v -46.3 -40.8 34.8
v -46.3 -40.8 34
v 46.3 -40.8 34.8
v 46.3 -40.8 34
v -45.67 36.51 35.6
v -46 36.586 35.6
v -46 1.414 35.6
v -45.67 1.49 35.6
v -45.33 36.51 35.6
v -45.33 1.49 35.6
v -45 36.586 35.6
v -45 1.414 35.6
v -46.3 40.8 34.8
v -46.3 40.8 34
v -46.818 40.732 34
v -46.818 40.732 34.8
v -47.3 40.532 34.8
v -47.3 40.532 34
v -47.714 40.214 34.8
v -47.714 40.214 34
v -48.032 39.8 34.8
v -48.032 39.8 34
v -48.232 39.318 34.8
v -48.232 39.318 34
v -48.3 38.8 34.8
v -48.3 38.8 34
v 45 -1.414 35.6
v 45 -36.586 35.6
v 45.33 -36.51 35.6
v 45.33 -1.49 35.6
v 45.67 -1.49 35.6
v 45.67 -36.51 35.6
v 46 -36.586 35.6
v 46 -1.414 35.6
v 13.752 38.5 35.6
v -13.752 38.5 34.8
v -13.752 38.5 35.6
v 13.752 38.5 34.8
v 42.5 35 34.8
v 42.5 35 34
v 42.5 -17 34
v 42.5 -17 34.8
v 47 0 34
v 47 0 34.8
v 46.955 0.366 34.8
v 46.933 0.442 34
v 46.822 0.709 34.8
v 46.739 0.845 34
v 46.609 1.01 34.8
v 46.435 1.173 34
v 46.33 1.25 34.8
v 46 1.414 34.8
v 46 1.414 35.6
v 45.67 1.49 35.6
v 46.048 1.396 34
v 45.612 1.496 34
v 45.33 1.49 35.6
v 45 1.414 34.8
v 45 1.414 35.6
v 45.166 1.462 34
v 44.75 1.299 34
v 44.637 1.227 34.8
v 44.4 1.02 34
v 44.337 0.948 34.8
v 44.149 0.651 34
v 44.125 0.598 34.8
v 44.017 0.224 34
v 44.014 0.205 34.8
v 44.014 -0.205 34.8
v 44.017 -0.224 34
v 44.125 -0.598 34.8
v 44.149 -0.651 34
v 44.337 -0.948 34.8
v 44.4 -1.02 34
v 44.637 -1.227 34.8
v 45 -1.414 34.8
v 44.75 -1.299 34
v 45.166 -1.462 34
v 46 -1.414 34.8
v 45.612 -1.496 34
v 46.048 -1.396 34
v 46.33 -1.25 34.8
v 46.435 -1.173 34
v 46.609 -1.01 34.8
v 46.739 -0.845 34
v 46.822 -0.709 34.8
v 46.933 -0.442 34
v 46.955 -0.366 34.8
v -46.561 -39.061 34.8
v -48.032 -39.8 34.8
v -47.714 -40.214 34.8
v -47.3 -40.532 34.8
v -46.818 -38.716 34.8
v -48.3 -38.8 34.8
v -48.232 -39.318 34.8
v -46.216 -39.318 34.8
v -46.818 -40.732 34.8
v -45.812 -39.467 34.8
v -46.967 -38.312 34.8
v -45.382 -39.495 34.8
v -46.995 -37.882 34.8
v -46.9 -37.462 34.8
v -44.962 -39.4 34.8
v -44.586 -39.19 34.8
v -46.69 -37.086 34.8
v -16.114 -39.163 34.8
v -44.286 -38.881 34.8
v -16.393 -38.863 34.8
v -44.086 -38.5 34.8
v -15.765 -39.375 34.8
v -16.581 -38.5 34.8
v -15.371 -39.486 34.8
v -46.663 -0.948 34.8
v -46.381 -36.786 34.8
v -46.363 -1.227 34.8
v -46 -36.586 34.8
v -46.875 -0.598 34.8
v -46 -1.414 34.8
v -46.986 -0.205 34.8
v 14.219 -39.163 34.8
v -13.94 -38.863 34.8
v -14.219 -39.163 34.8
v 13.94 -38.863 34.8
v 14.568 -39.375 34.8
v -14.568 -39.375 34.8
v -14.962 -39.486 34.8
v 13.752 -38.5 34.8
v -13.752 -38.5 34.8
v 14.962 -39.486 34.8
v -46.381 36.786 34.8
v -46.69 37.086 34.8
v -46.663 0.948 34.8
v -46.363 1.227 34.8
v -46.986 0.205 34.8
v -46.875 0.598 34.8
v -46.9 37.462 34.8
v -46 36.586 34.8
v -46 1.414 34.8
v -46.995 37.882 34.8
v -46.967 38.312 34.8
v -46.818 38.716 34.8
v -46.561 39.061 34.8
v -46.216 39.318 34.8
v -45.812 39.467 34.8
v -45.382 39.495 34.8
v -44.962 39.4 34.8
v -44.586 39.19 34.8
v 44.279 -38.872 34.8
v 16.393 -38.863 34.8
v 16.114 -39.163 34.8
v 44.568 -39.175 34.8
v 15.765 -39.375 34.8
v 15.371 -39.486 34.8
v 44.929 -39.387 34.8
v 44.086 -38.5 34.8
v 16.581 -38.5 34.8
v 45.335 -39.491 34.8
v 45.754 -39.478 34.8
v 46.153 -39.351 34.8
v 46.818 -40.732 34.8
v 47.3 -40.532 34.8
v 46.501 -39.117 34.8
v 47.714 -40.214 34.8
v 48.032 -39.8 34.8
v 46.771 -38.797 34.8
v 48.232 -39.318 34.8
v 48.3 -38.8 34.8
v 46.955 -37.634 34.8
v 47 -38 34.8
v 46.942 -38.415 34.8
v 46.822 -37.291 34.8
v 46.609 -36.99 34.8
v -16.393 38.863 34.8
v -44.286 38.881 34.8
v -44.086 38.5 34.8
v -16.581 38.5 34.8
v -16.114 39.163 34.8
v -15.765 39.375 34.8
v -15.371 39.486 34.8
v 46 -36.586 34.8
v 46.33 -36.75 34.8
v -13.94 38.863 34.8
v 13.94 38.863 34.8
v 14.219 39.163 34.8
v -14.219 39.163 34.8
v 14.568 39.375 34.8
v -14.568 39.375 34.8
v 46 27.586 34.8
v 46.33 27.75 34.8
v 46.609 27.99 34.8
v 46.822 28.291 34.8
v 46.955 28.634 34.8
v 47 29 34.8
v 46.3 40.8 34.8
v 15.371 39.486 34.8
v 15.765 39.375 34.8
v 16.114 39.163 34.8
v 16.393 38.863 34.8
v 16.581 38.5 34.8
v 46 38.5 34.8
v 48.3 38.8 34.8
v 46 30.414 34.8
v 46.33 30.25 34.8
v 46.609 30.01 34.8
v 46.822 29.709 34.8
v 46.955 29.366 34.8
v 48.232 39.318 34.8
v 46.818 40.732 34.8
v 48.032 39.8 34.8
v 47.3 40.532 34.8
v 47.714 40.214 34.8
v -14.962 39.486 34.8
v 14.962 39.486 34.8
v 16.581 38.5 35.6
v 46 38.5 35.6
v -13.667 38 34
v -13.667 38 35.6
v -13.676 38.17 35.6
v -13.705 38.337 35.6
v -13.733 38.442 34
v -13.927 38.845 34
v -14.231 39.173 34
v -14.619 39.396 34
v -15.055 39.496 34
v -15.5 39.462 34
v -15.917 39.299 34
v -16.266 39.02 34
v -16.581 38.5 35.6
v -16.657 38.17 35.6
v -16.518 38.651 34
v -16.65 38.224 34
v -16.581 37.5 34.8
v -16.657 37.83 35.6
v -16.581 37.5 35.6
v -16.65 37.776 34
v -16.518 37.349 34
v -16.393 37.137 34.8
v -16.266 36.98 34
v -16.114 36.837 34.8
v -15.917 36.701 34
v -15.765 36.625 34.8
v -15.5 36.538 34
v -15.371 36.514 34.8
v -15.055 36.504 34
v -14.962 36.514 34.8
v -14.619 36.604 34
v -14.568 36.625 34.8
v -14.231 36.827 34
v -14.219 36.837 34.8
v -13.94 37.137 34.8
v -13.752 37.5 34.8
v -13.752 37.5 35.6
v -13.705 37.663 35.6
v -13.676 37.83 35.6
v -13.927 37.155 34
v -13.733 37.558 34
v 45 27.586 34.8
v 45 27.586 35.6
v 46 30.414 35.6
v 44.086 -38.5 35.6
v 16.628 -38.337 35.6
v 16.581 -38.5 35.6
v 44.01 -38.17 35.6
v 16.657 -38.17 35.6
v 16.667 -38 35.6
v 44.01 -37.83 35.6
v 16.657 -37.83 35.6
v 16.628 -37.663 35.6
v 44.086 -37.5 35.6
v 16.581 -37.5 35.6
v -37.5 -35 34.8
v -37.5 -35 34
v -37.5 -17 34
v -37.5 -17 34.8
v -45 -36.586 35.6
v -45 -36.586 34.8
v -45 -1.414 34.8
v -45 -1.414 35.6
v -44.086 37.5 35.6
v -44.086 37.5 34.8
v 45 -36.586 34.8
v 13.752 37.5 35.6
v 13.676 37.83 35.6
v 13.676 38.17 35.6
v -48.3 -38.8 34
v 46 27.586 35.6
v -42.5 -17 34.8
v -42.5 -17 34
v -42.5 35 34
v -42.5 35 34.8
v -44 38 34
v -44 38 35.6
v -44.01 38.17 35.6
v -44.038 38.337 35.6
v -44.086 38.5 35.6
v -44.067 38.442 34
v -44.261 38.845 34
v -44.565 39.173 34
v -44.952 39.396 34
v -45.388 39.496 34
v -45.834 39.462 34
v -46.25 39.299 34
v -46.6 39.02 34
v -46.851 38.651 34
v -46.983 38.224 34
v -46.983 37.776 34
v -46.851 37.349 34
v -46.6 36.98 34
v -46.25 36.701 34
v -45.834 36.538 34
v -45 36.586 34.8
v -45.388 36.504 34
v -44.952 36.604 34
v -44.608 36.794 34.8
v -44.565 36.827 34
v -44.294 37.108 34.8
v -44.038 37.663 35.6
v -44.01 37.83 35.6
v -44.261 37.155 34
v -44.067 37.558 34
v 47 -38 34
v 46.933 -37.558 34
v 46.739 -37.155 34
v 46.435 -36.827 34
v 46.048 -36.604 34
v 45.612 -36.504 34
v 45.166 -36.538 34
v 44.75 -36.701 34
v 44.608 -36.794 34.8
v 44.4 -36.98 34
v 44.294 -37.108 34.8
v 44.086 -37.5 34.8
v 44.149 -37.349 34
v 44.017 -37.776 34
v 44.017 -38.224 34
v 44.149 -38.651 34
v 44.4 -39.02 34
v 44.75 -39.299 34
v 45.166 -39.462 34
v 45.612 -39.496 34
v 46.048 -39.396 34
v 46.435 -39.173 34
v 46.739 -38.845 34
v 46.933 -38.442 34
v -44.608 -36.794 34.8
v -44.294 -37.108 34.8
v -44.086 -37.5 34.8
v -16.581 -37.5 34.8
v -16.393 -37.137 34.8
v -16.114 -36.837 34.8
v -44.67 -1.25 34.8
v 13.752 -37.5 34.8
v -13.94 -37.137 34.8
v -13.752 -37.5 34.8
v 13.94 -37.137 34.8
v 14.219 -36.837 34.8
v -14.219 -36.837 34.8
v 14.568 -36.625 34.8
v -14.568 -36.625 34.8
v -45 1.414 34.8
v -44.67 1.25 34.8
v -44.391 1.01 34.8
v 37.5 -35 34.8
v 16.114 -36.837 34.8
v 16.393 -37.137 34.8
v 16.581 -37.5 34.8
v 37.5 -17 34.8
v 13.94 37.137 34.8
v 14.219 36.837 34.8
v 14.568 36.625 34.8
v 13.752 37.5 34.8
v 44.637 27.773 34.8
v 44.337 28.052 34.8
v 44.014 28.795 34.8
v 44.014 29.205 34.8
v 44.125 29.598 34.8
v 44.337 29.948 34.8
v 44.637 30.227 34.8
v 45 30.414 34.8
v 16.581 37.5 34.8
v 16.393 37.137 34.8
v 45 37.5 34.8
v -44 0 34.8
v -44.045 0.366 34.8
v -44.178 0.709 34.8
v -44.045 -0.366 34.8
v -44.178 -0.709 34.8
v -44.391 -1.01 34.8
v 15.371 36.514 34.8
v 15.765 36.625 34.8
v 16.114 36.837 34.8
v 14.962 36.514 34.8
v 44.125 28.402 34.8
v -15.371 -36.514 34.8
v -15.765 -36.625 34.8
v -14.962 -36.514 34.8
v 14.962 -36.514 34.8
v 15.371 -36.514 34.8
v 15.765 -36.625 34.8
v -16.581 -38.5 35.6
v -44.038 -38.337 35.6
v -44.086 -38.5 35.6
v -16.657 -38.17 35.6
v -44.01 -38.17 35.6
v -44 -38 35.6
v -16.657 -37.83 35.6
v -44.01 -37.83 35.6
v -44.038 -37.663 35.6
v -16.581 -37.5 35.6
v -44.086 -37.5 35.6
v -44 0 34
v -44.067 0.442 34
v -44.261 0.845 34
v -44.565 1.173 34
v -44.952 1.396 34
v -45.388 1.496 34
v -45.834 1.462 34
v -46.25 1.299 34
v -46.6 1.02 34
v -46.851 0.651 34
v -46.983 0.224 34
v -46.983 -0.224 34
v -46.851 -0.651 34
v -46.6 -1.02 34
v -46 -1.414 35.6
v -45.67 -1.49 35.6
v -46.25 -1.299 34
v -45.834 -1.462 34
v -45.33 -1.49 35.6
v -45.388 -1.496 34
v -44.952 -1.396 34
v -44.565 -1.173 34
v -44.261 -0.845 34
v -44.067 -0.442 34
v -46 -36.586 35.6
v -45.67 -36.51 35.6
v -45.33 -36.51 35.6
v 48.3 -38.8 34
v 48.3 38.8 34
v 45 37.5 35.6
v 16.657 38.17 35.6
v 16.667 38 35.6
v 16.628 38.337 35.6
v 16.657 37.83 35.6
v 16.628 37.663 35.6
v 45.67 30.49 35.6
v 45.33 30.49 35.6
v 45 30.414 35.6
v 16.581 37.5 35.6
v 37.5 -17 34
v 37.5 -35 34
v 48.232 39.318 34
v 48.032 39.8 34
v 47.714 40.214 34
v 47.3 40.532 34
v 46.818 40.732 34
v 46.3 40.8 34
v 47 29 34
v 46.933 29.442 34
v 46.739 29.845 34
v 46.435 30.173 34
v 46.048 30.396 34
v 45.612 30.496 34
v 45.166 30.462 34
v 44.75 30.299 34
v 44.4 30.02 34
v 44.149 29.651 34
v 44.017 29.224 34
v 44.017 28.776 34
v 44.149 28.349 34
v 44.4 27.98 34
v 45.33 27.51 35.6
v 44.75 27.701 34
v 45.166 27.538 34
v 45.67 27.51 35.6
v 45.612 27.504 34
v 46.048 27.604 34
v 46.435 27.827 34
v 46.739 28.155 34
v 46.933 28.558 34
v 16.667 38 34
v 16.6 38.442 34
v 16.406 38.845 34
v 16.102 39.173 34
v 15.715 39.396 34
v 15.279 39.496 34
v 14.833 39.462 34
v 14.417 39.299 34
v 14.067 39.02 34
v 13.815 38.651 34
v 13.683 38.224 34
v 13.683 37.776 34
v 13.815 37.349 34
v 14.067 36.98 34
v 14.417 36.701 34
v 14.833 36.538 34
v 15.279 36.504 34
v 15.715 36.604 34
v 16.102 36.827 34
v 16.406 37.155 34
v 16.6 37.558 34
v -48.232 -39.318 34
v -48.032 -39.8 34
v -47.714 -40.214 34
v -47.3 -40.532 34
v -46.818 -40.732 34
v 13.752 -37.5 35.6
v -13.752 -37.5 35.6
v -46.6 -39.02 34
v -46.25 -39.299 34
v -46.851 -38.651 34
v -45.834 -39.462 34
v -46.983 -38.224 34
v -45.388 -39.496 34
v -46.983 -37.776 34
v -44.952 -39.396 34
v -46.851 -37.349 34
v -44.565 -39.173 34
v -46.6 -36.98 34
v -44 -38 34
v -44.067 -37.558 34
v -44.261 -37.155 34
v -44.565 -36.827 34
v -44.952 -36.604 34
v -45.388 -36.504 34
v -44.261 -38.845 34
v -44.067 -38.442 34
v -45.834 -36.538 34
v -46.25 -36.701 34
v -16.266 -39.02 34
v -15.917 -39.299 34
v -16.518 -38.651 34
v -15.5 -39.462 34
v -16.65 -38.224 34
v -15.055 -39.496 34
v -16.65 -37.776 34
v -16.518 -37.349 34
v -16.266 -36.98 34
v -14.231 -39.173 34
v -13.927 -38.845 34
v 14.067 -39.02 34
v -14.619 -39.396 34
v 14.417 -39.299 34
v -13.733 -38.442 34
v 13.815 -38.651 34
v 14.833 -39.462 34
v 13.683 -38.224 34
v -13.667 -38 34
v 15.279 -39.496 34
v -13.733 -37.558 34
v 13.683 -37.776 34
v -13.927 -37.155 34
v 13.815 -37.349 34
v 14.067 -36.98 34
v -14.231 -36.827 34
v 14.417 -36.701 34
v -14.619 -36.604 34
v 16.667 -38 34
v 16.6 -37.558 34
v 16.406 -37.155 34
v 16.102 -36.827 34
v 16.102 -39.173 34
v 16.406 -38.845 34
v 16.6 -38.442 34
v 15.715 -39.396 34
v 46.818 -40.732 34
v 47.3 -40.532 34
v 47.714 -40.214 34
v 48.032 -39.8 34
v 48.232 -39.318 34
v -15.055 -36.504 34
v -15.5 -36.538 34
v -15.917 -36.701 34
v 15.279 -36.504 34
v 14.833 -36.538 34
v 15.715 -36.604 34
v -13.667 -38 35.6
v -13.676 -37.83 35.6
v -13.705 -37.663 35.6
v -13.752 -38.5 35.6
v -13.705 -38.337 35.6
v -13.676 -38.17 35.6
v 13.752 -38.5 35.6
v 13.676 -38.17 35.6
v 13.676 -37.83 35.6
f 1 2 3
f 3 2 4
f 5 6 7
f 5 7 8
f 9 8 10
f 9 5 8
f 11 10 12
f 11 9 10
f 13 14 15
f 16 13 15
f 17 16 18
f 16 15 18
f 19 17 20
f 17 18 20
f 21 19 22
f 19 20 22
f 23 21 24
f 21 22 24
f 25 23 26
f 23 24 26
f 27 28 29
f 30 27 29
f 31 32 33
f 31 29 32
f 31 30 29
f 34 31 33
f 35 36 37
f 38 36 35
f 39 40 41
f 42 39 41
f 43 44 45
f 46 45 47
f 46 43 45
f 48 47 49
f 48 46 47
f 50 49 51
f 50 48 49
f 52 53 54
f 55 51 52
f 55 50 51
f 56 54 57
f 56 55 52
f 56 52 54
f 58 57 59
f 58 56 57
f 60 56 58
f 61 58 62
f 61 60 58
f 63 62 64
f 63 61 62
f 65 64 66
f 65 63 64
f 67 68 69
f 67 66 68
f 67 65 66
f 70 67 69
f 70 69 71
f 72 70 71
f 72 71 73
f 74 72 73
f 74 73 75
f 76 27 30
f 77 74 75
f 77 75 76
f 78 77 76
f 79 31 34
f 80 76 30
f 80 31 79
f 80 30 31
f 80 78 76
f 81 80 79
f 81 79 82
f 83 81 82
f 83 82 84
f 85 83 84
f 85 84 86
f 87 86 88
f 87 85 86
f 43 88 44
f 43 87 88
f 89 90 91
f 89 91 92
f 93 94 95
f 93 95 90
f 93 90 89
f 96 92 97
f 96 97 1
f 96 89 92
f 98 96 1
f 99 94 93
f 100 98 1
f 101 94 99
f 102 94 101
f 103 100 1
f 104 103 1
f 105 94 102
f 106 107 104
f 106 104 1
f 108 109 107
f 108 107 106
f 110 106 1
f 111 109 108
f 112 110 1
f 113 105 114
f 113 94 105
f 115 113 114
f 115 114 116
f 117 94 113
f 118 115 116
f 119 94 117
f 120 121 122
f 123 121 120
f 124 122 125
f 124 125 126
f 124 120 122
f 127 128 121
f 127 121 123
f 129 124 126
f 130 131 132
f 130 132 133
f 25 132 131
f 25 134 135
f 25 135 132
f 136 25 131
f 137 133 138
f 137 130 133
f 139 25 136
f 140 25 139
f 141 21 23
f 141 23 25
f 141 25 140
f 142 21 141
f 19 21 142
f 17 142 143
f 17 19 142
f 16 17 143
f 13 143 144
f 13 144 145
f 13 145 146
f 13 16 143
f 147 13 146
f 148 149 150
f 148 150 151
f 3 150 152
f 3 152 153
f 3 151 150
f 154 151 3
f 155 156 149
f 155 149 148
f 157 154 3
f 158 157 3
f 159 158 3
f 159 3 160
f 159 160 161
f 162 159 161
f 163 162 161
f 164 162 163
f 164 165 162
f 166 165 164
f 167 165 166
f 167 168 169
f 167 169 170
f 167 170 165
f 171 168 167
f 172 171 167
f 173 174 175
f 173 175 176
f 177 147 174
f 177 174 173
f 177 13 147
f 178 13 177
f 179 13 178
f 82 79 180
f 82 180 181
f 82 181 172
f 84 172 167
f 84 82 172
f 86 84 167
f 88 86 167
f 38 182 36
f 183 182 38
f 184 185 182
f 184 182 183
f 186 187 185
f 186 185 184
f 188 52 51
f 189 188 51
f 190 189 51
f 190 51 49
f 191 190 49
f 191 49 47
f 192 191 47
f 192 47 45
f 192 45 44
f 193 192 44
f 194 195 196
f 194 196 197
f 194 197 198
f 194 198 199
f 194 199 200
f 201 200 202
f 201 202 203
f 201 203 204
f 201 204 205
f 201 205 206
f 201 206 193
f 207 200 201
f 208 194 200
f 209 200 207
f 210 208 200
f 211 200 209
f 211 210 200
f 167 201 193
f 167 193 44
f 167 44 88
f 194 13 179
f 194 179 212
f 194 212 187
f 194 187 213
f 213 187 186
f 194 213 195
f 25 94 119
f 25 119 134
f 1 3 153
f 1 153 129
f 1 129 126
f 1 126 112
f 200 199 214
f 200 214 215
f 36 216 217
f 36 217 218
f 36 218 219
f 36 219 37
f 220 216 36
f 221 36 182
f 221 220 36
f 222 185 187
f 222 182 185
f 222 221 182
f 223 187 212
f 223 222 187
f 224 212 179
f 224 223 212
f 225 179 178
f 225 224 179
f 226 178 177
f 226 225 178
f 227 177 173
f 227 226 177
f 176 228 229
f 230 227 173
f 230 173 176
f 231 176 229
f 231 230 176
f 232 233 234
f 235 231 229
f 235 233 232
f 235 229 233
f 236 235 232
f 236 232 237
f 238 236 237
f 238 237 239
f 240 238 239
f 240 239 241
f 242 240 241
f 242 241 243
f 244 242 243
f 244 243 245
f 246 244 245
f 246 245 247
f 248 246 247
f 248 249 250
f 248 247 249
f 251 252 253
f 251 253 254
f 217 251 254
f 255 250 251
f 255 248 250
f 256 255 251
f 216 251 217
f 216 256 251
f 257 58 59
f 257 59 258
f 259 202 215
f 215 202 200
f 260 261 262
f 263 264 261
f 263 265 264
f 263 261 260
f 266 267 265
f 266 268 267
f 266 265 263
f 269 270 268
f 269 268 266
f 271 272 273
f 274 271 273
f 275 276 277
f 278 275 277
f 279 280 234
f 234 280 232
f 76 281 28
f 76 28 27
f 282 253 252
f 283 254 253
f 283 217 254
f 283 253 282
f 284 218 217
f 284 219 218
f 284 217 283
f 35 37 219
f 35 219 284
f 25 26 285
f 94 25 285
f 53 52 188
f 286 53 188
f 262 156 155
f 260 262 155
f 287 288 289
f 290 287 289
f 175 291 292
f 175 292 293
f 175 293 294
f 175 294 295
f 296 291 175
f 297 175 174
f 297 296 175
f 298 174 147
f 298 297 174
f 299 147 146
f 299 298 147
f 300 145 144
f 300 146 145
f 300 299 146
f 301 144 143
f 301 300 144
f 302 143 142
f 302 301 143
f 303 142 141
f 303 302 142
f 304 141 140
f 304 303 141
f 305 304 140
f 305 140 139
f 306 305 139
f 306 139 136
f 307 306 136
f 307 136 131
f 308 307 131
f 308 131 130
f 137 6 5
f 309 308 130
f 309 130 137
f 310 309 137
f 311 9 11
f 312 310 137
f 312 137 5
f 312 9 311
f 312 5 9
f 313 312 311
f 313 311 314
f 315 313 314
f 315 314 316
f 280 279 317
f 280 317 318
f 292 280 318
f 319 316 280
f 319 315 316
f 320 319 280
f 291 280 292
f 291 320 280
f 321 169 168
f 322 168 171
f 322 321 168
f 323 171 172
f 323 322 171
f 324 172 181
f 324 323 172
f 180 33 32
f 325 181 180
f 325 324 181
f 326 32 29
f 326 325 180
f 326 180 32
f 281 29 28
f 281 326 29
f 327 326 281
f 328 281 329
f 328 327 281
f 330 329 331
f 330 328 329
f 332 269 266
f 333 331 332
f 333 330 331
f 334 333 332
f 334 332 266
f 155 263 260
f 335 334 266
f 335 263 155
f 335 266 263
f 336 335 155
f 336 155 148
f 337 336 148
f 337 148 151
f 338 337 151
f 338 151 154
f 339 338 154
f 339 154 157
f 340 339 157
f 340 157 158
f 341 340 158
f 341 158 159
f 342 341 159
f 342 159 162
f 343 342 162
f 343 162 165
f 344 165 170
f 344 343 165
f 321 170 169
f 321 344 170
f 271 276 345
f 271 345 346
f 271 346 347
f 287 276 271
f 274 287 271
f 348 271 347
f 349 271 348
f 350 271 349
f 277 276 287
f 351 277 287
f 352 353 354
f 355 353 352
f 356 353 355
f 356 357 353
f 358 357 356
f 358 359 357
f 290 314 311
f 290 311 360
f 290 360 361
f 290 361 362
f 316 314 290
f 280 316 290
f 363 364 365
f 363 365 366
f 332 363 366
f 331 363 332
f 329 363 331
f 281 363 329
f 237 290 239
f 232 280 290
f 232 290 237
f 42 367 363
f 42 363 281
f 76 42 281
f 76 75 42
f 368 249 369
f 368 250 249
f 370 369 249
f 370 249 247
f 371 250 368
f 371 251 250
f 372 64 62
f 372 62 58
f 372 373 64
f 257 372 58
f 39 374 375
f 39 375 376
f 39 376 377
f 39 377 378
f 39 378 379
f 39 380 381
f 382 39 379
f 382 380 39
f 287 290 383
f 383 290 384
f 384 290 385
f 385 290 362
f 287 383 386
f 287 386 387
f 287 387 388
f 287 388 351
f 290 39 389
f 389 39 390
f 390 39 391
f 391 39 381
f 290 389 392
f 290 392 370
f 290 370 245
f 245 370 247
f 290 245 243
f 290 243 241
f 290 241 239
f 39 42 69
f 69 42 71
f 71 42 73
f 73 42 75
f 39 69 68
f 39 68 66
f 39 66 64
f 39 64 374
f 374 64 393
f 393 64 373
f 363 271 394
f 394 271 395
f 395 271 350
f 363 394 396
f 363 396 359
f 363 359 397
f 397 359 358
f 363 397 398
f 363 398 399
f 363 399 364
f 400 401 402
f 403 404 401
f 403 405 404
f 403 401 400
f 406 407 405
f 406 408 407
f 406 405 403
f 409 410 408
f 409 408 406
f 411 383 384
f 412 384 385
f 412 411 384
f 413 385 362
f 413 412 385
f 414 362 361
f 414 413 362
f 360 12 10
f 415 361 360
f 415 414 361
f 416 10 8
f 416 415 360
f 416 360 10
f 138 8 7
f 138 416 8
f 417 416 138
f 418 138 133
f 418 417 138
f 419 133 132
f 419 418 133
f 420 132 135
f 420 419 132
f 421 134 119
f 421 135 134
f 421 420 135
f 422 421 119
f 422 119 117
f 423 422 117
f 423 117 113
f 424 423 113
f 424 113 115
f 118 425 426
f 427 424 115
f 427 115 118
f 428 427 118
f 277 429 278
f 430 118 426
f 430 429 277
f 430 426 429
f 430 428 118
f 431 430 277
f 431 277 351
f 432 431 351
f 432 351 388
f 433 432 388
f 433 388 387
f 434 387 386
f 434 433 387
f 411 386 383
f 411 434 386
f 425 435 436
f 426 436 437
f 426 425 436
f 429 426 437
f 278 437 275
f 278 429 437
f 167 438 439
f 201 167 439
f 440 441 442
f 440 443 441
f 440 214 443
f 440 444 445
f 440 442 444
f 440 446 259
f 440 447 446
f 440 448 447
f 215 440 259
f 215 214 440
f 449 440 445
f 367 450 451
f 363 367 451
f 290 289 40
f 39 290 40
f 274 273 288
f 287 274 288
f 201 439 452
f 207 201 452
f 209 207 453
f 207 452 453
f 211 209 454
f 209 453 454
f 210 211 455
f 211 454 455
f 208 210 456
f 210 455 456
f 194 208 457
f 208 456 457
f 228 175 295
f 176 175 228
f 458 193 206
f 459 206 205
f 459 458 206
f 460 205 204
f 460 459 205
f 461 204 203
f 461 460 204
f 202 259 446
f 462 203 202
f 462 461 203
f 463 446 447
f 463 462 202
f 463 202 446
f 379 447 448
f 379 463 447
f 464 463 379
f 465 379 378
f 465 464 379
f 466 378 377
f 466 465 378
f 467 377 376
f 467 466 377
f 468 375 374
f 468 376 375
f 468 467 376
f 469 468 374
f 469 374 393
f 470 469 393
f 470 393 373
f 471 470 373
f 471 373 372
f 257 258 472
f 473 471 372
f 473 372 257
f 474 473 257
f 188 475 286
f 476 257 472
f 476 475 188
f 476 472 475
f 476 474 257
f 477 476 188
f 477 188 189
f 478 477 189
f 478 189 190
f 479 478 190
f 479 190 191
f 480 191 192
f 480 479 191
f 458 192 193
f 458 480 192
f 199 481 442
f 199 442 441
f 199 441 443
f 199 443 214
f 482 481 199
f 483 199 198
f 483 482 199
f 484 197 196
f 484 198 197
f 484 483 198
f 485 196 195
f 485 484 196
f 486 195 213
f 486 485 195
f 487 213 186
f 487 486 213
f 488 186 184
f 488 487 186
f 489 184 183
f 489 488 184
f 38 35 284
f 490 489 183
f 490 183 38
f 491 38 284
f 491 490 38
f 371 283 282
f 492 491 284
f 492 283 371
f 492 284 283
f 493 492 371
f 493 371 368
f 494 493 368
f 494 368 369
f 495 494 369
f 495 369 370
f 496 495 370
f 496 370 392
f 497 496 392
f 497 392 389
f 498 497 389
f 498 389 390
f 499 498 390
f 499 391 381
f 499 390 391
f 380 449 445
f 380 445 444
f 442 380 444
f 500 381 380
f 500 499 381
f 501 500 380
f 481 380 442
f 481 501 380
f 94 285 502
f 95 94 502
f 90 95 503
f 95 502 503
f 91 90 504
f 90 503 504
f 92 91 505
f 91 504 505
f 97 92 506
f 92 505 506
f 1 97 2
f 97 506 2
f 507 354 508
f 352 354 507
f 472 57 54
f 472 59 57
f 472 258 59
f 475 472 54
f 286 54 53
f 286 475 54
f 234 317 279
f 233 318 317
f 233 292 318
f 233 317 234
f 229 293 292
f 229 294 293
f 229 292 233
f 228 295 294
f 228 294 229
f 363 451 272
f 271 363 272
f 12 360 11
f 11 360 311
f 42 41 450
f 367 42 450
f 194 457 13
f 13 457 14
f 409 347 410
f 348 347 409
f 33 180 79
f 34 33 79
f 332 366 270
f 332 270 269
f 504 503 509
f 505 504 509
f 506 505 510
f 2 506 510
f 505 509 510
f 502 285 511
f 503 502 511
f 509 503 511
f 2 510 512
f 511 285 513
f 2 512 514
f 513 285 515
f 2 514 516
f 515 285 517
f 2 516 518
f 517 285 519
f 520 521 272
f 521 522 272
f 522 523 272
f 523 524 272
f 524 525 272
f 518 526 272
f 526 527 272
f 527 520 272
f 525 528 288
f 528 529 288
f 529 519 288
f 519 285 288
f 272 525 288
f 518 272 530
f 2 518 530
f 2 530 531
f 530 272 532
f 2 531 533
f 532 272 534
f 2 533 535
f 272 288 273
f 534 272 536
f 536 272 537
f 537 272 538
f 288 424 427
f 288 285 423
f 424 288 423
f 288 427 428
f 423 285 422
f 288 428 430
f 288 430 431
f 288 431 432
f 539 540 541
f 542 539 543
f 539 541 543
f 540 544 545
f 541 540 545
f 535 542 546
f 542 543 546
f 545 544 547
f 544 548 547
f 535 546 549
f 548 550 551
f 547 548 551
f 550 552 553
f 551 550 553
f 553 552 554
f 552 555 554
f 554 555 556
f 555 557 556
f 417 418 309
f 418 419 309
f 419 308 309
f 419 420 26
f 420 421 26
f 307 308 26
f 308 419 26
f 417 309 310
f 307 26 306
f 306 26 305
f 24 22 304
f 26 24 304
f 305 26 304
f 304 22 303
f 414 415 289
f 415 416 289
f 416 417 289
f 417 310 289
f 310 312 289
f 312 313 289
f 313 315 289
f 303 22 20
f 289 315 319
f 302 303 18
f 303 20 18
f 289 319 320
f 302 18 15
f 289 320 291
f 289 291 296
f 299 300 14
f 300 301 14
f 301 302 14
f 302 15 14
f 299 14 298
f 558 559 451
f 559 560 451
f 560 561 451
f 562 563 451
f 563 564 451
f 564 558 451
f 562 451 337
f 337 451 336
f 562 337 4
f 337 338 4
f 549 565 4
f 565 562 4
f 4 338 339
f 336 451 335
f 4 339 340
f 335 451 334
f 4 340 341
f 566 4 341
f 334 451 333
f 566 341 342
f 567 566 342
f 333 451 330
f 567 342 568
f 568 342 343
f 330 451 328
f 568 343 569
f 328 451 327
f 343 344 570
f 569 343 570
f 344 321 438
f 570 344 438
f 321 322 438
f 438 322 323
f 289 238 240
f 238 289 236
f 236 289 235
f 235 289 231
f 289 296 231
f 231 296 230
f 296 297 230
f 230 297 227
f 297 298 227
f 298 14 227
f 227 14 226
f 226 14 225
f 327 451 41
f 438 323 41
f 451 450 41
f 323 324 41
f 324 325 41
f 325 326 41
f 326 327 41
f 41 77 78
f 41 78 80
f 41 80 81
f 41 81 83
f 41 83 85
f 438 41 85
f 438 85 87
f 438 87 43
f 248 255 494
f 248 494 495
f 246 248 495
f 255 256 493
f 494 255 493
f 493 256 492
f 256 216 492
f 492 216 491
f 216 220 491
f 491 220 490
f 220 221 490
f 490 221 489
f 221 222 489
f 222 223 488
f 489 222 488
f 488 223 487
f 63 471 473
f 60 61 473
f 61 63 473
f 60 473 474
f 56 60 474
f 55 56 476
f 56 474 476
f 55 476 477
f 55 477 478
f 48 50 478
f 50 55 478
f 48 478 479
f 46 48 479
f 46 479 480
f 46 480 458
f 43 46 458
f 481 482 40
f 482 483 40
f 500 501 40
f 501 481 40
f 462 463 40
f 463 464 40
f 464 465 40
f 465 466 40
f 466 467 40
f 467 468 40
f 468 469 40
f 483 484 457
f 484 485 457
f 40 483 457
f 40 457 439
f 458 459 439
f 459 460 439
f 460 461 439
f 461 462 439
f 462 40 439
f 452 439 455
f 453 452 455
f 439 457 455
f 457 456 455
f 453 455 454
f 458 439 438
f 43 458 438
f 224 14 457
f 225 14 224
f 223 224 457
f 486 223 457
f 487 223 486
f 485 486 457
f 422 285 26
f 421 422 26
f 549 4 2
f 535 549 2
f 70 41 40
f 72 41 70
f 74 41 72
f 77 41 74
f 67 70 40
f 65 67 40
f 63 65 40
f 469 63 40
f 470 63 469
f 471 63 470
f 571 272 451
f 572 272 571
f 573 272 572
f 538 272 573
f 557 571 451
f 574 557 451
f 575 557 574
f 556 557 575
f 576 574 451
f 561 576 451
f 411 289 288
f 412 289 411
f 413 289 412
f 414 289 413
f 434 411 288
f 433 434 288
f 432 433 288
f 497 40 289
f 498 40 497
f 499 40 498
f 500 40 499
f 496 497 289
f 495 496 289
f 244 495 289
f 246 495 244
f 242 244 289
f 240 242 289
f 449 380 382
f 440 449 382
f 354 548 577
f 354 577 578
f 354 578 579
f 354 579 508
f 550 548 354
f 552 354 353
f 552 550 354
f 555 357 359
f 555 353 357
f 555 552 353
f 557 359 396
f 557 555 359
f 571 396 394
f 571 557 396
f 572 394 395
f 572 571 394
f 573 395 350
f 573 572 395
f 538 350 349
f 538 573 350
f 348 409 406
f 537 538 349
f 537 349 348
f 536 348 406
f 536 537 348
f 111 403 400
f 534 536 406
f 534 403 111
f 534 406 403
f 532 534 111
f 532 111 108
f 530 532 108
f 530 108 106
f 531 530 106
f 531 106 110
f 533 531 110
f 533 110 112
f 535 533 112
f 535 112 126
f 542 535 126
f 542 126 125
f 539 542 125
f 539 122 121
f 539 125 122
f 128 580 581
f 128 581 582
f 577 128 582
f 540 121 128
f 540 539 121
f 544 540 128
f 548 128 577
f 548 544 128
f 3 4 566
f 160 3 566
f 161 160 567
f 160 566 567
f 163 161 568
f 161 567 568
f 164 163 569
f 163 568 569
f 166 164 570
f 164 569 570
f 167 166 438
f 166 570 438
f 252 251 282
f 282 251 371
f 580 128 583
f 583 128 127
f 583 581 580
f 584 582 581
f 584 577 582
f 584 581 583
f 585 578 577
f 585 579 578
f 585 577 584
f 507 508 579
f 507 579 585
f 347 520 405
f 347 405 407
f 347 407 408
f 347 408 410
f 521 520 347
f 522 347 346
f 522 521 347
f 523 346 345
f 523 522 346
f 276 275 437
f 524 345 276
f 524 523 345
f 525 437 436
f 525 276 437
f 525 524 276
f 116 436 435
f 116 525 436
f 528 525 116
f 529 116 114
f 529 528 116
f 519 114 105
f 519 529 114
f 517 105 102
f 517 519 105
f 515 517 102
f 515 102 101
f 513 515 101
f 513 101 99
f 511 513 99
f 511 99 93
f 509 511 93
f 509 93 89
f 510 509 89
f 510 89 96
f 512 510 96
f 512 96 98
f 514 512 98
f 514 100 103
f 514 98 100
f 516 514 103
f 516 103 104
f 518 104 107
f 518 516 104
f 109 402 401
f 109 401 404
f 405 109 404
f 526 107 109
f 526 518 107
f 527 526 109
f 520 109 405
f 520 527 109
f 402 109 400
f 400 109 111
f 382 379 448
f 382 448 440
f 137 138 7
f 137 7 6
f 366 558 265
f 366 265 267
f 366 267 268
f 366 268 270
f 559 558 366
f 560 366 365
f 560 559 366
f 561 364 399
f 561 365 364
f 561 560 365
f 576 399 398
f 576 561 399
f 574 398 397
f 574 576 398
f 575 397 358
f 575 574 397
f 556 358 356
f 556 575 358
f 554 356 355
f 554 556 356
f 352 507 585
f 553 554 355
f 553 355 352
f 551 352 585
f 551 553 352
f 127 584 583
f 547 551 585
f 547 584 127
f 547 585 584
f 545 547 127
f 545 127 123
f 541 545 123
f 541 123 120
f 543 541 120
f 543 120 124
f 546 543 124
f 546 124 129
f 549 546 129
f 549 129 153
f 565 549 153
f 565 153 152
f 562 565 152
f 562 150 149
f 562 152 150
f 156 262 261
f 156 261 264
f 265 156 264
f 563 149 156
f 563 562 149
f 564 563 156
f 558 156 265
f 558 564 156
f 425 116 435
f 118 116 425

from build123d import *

# Parameters (mm, degrees)
PAD011_DEPTH         = 0.8
SKETCH019_W          = 92
SKETCH019_H          = 77
SKETCH019_W_2        = 90
SKETCH019_H_2        = 75
PAD012_DEPTH         = 1.6
SKETCH018_R          = 1.5
POCKET007_DEPTH      = 1.6
POCKET007_DEPTH_BACK = 0.8


with BuildPart() as part:
    # Sketch017 (on XY_Plane002 of Origin004) → Pad011 (new body)
    with BuildSketch(Plane.XY):
        with BuildLine():
            Line((48.3, -38.8), (48.3, 38.8))
            ThreePointArc((48.3, 38.8), (47.714214, 40.214214), (46.3, 40.8))
            Line((46.3, 40.8), (-46.3, 40.8))
            ThreePointArc((-46.3, 40.8), (-47.714214, 40.214214), (-48.3, 38.8))
            Line((-48.3, 38.8), (-48.3, -38.8))
            ThreePointArc((-48.3, -38.8), (-47.714214, -40.214214), (-46.3, -40.8))
            Line((-46.3, -40.8), (46.3, -40.8))
            ThreePointArc((46.3, -40.8), (47.714214, -40.214214), (48.3, -38.8))
        make_face()
        Polygon((-42.5, 35), (42.5, 35), (42.5, -17), (37.5, -17), (37.5, -35), (-37.5, -35), (-37.5, -17), (-42.5, -17), align=None, mode=Mode.SUBTRACT)
    extrude(amount=PAD011_DEPTH)

    # Sketch019 (on XY_Plane002 of Origin004) → Pad012 (join)
    with BuildSketch(Plane.XY):
        Rectangle(SKETCH019_W, SKETCH019_H)
        Rectangle(SKETCH019_W_2, SKETCH019_H_2, mode=Mode.SUBTRACT)
    extrude(amount=PAD012_DEPTH)

    # Sketch018 (on XY_Plane002 of Origin004) → Pocket007 (cut, two sides)
    with BuildSketch(Plane.XY) as pocket007_sk:
        with Locations((-45.5, 38)):
            Circle(SKETCH018_R)
        with Locations((-15.166667, 38)):
            Circle(SKETCH018_R)
        with Locations((15.166667, 38)):
            Circle(SKETCH018_R)
        with Locations((45.5, 29)):
            Circle(SKETCH018_R)
        with Locations((45.5, 0)):
            Circle(SKETCH018_R)
        with Locations((45.5, -38)):
            Circle(SKETCH018_R)
        with Locations((15.166667, -38)):
            Circle(SKETCH018_R)
        with Locations((-15.166667, -38)):
            Circle(SKETCH018_R)
        with Locations((-45.5, -38)):
            Circle(SKETCH018_R)
        with Locations((-45.5, 0)):
            Circle(SKETCH018_R)
    extrude(amount=POCKET007_DEPTH, mode=Mode.SUBTRACT)
    extrude(pocket007_sk.sketch, amount=-POCKET007_DEPTH_BACK, mode=Mode.SUBTRACT)


with BuildPart() as part_1:
    # Body002 placement: moved
    add(part.part.moved(Location((0, 0, 34))))


solid = part_1.part
